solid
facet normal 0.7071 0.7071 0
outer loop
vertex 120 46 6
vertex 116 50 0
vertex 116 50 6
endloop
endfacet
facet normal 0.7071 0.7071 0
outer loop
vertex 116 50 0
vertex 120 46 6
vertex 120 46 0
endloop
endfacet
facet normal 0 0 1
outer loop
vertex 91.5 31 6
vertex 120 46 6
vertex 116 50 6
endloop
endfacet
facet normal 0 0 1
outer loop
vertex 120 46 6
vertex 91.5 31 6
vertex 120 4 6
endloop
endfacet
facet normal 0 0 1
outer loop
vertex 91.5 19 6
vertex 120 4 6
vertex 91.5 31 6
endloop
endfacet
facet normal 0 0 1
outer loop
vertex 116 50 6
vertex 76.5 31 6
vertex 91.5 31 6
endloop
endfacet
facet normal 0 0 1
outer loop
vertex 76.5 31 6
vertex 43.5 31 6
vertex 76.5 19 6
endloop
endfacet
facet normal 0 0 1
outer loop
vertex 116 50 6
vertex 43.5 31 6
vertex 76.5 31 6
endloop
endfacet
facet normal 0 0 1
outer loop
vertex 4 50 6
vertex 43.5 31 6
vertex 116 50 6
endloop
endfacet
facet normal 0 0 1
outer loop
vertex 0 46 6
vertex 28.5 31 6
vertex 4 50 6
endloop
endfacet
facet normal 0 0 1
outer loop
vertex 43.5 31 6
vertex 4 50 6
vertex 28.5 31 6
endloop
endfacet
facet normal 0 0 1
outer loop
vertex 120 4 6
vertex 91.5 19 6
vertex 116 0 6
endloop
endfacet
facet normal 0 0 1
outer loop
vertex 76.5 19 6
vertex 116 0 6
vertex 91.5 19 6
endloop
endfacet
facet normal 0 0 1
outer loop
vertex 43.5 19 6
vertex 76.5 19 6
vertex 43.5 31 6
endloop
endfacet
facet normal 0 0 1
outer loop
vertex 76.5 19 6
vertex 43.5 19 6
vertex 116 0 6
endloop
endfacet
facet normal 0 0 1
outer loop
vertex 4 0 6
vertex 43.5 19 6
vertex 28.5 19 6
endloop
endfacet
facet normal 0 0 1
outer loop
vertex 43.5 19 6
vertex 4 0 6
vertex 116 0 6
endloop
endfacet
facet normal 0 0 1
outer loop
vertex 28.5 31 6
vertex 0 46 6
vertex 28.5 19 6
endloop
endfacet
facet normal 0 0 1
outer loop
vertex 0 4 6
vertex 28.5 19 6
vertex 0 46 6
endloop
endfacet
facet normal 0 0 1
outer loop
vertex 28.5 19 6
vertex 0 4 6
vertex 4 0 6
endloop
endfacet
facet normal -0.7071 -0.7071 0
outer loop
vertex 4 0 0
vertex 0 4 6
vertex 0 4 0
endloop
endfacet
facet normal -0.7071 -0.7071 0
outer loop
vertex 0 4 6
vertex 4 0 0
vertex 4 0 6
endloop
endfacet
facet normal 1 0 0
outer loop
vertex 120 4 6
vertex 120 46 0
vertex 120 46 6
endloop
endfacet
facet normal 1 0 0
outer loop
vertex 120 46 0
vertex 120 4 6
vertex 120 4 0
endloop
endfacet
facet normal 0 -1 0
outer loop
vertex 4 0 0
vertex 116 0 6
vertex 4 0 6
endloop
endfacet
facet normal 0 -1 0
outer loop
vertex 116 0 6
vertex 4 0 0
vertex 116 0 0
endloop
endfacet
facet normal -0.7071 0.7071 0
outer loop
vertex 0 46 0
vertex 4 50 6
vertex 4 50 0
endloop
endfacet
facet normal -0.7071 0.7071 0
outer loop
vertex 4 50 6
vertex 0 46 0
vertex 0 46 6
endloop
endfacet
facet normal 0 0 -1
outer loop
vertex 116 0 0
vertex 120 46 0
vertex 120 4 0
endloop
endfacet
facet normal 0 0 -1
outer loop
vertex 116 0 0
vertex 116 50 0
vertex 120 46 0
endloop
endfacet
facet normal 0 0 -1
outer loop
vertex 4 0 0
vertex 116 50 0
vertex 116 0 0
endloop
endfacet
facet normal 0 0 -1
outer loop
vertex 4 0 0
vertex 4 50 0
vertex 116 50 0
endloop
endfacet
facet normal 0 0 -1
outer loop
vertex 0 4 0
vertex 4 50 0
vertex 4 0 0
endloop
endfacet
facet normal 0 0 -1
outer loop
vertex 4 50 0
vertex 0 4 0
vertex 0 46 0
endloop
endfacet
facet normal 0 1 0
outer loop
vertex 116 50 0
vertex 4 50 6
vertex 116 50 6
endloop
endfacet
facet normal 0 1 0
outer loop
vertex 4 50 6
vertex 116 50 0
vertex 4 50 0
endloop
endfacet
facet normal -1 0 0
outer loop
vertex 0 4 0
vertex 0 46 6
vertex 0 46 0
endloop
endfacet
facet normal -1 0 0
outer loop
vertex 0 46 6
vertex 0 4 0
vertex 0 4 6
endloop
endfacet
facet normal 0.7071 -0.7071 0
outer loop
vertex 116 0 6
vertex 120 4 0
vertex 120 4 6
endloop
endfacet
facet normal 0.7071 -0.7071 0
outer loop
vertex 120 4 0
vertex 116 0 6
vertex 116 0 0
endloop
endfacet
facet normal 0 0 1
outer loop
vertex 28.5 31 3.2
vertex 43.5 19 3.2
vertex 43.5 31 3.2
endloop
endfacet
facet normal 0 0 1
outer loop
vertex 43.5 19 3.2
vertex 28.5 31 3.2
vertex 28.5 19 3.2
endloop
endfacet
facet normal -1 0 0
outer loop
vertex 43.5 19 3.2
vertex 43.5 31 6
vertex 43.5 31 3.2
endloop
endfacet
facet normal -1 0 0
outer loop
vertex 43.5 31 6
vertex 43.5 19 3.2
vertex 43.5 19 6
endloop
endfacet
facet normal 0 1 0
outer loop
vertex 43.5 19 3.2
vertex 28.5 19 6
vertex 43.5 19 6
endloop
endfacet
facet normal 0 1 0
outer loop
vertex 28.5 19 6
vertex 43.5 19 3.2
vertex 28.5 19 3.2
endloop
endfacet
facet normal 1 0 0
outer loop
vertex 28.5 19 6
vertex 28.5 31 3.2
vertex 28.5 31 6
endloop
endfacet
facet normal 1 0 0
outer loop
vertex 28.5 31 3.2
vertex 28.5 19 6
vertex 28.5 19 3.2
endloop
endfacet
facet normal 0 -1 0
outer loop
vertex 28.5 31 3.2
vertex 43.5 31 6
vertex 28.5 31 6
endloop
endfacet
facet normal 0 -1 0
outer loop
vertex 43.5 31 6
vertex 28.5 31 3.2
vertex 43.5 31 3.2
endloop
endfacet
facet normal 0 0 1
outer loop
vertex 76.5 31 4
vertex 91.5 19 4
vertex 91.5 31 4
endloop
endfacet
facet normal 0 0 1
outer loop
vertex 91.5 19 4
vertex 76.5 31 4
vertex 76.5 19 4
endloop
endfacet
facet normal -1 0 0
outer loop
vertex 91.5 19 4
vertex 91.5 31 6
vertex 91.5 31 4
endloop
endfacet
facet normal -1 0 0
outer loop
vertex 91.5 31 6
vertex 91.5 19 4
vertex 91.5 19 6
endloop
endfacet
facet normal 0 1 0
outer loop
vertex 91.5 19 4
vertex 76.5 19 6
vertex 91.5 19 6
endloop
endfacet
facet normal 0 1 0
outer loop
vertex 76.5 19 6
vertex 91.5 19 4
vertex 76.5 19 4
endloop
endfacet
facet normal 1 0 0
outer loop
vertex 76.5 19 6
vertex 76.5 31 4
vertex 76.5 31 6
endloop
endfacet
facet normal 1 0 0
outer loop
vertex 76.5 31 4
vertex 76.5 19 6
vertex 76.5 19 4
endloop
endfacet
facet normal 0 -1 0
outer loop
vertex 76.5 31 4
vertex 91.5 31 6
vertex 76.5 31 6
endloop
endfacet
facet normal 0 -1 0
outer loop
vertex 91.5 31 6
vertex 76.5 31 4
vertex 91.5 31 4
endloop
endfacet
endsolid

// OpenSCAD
$fn = 32;

// ----------------------------------------------------------------------
// Windowed plate: 2 voids, 120 x 50 x 6 mm
// ----------------------------------------------------------------------

// --- parameters (mm) ---
plate_l = 120;            // plate length, X
plate_w = 50;             // plate width, Y
plate_t = 6;              // plate thickness, Z
edge_margin = 12;         // wall from the plate edge to any window
windows = 2;              // number of windows in the row
win_l = 15;               // window length
win_w = 12;               // window width
win_pitch = 48;           // window pitch along X
depth_1 = 2.8;            // depth of void 1 (full thickness = through)
depth_2 = 2;              // depth of void 2 (full thickness = through)
corner_c = 4;             // corner chamfer of the plate
fit_tol = 0.02;           // declared fit tolerance (prompt contract)
free_tol = 0.2;           // declared free tolerance (prompt contract)

profile = [[4, 0], [116, 0], [120, 4], [120, 46], [116, 50], [4, 50], [0, 46], [0, 4]];  // primary outline, 8 points, counter clockwise
void_1 = [[28.5, 19], [43.5, 19], [43.5, 31], [28.5, 31]];  // window 1 of the row, 4 points
void_2 = [[76.5, 19], [91.5, 19], [91.5, 31], [76.5, 31]];  // window 2 of the row, 4 points

// --- the one profile operation ---
difference() {
  linear_extrude(height = plate_t) polygon(points = profile);
  translate([0, 0, plate_t - depth_1])
    linear_extrude(height = depth_1 + 1) polygon(points = void_1);
  translate([0, 0, plate_t - depth_2])
    linear_extrude(height = depth_2 + 1) polygon(points = void_2);
}
